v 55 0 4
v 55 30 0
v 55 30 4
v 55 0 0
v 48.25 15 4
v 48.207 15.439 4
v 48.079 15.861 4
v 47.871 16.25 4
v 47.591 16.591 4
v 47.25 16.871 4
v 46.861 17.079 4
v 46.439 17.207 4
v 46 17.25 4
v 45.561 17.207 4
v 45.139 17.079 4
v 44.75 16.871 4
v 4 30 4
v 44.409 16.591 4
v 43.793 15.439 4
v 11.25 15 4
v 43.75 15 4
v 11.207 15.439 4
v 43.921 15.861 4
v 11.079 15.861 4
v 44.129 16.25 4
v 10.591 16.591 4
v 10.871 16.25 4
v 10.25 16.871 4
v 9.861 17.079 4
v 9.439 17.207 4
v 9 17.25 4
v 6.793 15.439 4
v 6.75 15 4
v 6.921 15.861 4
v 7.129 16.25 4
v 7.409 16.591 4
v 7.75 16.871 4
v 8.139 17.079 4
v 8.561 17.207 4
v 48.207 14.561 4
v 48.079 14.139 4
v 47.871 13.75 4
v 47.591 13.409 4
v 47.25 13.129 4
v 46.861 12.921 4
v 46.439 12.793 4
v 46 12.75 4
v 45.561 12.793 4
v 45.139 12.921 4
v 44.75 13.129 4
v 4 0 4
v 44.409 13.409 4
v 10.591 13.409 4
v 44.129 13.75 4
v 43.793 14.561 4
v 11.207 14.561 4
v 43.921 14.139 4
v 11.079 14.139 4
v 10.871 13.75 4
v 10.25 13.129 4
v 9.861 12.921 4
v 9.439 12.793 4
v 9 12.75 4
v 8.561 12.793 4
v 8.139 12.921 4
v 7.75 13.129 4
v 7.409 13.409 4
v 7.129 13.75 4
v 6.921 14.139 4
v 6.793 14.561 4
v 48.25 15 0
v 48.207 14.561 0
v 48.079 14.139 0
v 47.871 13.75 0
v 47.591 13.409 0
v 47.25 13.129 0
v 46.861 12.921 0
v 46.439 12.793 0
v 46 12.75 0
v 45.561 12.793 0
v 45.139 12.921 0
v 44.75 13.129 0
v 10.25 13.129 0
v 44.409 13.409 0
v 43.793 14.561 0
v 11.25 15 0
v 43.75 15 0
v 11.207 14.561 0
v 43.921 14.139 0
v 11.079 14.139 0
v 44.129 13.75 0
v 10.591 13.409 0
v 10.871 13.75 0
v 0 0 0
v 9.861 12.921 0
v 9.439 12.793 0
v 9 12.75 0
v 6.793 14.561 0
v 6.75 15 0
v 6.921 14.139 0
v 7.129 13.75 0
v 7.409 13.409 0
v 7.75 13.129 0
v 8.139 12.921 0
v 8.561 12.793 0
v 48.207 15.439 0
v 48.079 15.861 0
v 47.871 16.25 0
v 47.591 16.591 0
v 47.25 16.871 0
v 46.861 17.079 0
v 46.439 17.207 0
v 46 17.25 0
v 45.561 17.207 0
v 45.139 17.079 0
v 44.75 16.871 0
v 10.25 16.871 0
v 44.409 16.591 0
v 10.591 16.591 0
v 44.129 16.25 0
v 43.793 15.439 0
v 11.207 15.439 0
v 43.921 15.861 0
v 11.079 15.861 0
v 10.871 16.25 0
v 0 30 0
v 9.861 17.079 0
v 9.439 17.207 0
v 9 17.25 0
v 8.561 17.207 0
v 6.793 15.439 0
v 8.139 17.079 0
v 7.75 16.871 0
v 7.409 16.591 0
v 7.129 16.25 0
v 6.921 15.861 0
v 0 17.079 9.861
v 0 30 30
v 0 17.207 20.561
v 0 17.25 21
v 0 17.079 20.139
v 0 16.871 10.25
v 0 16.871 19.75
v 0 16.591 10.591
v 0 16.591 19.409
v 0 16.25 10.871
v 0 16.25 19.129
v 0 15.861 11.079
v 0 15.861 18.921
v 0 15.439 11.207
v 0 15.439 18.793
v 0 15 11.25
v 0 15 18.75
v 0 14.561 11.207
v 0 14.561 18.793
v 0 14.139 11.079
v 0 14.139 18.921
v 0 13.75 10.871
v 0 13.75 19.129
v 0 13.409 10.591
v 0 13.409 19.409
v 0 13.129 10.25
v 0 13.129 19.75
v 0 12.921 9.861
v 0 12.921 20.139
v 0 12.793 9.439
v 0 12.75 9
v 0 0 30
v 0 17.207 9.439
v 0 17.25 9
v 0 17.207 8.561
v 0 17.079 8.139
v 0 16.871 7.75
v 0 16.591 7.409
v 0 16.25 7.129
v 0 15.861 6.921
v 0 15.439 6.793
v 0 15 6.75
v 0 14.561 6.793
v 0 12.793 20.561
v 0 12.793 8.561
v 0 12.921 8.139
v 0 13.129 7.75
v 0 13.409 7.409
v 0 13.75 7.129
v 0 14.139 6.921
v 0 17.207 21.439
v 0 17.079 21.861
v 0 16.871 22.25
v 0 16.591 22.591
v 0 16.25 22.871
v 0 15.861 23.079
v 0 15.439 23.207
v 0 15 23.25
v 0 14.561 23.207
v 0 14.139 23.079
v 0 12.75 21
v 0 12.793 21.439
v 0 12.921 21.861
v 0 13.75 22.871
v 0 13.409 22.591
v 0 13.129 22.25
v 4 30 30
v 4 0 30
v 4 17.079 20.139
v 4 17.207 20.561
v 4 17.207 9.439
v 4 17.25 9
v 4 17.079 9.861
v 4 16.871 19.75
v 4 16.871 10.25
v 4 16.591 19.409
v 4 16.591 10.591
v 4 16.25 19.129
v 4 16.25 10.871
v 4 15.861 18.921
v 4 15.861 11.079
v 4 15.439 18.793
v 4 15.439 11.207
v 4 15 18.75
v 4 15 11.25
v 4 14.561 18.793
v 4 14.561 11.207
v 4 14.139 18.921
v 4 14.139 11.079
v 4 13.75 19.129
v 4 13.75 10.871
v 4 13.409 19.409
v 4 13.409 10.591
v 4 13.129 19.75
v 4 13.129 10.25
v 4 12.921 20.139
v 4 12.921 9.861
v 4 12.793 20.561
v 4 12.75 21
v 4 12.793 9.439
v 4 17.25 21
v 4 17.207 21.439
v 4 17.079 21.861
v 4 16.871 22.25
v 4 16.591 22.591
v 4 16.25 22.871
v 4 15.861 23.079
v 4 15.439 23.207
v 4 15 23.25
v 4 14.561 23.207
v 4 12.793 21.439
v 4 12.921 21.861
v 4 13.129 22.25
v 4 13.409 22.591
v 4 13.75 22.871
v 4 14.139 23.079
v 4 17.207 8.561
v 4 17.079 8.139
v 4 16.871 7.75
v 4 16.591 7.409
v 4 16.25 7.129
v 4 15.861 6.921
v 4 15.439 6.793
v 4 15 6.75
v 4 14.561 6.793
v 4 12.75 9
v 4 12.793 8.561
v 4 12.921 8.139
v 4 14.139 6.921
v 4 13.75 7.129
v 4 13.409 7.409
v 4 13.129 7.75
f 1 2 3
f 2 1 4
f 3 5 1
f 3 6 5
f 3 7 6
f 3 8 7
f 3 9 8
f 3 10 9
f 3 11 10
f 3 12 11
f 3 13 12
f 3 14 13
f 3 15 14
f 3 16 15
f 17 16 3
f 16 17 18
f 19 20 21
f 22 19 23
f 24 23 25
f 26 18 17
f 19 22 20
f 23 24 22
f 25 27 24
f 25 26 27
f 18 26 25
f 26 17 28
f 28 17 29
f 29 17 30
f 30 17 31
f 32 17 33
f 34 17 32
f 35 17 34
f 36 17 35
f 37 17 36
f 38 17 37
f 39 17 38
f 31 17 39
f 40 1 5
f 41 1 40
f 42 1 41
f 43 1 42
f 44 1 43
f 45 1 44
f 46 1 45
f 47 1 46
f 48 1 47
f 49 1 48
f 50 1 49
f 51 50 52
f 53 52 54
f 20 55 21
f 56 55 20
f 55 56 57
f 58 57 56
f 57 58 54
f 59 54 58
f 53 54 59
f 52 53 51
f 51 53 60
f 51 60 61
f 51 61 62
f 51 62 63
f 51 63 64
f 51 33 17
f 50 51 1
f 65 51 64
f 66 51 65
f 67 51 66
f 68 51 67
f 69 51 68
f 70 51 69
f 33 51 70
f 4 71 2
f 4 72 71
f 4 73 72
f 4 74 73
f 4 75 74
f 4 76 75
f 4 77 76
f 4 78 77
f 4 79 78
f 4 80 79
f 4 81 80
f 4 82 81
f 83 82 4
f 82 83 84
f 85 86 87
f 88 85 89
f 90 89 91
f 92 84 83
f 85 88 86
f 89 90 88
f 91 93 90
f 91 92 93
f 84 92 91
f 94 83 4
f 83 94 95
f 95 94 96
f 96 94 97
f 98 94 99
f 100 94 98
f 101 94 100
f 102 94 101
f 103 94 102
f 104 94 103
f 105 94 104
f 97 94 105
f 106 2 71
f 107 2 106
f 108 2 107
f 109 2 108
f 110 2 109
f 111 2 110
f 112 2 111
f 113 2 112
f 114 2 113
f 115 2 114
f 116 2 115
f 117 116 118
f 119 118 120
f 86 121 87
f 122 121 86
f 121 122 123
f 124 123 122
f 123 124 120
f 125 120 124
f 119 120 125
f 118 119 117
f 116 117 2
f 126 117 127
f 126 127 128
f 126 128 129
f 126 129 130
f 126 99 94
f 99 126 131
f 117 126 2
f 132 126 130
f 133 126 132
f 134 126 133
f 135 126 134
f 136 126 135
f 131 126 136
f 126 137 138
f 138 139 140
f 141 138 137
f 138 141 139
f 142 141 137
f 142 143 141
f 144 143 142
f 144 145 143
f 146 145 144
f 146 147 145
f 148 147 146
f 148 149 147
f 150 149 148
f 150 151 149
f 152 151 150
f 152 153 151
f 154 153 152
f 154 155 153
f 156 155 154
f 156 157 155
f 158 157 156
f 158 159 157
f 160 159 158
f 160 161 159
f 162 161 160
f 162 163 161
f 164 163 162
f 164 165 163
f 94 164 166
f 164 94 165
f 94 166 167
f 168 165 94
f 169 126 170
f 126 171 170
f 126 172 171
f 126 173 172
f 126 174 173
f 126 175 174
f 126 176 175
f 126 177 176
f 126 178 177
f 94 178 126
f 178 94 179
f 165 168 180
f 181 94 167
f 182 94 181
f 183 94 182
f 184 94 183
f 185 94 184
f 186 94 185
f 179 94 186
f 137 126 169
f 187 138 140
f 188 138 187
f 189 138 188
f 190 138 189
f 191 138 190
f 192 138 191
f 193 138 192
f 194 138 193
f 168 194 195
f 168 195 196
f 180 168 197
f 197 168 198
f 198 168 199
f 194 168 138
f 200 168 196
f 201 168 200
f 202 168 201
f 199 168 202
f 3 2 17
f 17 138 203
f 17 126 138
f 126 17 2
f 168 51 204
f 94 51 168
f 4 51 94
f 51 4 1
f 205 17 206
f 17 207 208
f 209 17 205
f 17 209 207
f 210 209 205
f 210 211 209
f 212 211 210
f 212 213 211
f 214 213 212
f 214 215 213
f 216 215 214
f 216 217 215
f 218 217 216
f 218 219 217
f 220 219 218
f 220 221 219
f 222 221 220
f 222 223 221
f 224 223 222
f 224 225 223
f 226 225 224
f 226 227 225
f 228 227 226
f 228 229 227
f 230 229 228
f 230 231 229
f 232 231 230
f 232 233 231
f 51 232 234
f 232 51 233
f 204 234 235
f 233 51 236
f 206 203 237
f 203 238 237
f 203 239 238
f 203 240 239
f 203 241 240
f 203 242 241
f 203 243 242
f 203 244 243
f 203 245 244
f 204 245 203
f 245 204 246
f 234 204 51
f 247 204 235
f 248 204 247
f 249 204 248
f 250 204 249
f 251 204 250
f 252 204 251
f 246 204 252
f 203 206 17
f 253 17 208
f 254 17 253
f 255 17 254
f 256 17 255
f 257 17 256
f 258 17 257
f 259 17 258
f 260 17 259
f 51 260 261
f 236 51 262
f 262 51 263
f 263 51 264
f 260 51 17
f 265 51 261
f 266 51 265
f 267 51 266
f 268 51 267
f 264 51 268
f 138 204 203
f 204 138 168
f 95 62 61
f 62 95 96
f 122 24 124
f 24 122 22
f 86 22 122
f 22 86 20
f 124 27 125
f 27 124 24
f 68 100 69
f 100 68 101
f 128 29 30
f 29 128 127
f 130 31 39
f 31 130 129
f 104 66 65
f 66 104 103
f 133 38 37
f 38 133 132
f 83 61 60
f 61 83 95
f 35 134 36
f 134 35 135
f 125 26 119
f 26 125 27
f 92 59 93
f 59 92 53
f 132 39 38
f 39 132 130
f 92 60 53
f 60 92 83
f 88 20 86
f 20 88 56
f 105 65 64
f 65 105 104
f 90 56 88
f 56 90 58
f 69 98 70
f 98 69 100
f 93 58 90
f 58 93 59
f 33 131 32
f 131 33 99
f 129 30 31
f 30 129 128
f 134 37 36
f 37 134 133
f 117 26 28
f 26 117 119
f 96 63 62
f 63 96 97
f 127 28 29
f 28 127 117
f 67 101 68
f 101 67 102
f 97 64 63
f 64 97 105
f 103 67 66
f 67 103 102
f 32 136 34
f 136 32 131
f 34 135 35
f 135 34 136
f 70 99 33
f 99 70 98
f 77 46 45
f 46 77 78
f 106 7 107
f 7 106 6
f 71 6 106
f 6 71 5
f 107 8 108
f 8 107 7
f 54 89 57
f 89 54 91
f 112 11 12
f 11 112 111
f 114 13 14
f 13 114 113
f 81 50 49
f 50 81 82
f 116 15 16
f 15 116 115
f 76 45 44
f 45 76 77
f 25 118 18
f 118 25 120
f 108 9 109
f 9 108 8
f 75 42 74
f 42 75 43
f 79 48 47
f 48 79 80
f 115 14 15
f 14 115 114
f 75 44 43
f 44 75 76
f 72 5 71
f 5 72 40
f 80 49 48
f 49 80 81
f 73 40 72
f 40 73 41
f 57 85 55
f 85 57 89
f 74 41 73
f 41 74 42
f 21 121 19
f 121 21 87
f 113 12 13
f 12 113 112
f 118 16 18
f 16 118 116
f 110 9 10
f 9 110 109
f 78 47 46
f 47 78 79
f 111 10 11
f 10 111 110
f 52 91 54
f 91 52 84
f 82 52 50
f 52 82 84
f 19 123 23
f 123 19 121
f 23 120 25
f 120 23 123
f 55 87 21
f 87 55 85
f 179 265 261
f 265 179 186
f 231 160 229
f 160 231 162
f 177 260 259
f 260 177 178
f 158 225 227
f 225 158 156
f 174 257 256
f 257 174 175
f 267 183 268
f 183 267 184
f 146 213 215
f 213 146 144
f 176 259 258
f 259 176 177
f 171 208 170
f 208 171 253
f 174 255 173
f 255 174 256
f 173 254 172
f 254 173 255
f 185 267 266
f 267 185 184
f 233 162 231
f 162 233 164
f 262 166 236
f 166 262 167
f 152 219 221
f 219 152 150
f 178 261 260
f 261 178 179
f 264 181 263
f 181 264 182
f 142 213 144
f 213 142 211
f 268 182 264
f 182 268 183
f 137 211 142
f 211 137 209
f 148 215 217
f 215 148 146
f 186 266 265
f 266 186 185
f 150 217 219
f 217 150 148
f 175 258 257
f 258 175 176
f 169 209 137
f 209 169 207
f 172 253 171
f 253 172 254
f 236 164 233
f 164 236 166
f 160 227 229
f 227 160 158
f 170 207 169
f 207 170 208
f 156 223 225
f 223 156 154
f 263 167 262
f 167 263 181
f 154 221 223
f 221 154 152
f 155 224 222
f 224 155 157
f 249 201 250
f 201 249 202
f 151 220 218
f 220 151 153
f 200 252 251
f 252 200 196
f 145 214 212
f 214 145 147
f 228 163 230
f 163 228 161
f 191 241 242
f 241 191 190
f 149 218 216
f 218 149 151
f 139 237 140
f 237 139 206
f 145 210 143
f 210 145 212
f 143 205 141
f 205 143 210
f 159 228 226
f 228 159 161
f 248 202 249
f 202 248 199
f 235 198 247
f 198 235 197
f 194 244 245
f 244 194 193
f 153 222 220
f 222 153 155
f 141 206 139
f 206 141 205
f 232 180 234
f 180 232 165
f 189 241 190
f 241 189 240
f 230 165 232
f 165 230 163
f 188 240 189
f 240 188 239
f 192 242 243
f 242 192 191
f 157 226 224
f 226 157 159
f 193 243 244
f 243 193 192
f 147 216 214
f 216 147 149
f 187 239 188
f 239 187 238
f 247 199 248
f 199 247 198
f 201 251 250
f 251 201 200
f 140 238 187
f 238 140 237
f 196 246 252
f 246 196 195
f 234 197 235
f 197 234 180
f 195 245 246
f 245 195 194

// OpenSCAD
$fn = 32;

// ----------------------------------------------------------------------
// L-bracket: 55 x 30 x 30 mm
// ----------------------------------------------------------------------

// --- parameters (mm) ---
horiz_len = 55;           // horizontal leg, X
vert_len = 30;            // vertical leg, Z
profile_w = 30;           // bracket depth, Y
plate_t = 4;              // plate thickness
hole_d = 4.5;             // clearance for M4

module hole_z(px, py) {
  translate([px, py, -2.5]) cylinder(h = plate_t + 5, d = hole_d);
}
module hole_x(pz, py) {
  translate([-2.5, py, pz]) rotate([0, 90, 0]) cylinder(h = plate_t + 5, d = hole_d);
}

difference() {
  union() {
    /* horizontal leg */
    cube([horiz_len, profile_w, plate_t]);
    /* vertical leg, overlapping the corner block */
    cube([plate_t, profile_w, vert_len]);
  }
  hole_z(9, 15);
  hole_z(46, 15);
  hole_x(9, 15);
  hole_x(21, 15);
}
